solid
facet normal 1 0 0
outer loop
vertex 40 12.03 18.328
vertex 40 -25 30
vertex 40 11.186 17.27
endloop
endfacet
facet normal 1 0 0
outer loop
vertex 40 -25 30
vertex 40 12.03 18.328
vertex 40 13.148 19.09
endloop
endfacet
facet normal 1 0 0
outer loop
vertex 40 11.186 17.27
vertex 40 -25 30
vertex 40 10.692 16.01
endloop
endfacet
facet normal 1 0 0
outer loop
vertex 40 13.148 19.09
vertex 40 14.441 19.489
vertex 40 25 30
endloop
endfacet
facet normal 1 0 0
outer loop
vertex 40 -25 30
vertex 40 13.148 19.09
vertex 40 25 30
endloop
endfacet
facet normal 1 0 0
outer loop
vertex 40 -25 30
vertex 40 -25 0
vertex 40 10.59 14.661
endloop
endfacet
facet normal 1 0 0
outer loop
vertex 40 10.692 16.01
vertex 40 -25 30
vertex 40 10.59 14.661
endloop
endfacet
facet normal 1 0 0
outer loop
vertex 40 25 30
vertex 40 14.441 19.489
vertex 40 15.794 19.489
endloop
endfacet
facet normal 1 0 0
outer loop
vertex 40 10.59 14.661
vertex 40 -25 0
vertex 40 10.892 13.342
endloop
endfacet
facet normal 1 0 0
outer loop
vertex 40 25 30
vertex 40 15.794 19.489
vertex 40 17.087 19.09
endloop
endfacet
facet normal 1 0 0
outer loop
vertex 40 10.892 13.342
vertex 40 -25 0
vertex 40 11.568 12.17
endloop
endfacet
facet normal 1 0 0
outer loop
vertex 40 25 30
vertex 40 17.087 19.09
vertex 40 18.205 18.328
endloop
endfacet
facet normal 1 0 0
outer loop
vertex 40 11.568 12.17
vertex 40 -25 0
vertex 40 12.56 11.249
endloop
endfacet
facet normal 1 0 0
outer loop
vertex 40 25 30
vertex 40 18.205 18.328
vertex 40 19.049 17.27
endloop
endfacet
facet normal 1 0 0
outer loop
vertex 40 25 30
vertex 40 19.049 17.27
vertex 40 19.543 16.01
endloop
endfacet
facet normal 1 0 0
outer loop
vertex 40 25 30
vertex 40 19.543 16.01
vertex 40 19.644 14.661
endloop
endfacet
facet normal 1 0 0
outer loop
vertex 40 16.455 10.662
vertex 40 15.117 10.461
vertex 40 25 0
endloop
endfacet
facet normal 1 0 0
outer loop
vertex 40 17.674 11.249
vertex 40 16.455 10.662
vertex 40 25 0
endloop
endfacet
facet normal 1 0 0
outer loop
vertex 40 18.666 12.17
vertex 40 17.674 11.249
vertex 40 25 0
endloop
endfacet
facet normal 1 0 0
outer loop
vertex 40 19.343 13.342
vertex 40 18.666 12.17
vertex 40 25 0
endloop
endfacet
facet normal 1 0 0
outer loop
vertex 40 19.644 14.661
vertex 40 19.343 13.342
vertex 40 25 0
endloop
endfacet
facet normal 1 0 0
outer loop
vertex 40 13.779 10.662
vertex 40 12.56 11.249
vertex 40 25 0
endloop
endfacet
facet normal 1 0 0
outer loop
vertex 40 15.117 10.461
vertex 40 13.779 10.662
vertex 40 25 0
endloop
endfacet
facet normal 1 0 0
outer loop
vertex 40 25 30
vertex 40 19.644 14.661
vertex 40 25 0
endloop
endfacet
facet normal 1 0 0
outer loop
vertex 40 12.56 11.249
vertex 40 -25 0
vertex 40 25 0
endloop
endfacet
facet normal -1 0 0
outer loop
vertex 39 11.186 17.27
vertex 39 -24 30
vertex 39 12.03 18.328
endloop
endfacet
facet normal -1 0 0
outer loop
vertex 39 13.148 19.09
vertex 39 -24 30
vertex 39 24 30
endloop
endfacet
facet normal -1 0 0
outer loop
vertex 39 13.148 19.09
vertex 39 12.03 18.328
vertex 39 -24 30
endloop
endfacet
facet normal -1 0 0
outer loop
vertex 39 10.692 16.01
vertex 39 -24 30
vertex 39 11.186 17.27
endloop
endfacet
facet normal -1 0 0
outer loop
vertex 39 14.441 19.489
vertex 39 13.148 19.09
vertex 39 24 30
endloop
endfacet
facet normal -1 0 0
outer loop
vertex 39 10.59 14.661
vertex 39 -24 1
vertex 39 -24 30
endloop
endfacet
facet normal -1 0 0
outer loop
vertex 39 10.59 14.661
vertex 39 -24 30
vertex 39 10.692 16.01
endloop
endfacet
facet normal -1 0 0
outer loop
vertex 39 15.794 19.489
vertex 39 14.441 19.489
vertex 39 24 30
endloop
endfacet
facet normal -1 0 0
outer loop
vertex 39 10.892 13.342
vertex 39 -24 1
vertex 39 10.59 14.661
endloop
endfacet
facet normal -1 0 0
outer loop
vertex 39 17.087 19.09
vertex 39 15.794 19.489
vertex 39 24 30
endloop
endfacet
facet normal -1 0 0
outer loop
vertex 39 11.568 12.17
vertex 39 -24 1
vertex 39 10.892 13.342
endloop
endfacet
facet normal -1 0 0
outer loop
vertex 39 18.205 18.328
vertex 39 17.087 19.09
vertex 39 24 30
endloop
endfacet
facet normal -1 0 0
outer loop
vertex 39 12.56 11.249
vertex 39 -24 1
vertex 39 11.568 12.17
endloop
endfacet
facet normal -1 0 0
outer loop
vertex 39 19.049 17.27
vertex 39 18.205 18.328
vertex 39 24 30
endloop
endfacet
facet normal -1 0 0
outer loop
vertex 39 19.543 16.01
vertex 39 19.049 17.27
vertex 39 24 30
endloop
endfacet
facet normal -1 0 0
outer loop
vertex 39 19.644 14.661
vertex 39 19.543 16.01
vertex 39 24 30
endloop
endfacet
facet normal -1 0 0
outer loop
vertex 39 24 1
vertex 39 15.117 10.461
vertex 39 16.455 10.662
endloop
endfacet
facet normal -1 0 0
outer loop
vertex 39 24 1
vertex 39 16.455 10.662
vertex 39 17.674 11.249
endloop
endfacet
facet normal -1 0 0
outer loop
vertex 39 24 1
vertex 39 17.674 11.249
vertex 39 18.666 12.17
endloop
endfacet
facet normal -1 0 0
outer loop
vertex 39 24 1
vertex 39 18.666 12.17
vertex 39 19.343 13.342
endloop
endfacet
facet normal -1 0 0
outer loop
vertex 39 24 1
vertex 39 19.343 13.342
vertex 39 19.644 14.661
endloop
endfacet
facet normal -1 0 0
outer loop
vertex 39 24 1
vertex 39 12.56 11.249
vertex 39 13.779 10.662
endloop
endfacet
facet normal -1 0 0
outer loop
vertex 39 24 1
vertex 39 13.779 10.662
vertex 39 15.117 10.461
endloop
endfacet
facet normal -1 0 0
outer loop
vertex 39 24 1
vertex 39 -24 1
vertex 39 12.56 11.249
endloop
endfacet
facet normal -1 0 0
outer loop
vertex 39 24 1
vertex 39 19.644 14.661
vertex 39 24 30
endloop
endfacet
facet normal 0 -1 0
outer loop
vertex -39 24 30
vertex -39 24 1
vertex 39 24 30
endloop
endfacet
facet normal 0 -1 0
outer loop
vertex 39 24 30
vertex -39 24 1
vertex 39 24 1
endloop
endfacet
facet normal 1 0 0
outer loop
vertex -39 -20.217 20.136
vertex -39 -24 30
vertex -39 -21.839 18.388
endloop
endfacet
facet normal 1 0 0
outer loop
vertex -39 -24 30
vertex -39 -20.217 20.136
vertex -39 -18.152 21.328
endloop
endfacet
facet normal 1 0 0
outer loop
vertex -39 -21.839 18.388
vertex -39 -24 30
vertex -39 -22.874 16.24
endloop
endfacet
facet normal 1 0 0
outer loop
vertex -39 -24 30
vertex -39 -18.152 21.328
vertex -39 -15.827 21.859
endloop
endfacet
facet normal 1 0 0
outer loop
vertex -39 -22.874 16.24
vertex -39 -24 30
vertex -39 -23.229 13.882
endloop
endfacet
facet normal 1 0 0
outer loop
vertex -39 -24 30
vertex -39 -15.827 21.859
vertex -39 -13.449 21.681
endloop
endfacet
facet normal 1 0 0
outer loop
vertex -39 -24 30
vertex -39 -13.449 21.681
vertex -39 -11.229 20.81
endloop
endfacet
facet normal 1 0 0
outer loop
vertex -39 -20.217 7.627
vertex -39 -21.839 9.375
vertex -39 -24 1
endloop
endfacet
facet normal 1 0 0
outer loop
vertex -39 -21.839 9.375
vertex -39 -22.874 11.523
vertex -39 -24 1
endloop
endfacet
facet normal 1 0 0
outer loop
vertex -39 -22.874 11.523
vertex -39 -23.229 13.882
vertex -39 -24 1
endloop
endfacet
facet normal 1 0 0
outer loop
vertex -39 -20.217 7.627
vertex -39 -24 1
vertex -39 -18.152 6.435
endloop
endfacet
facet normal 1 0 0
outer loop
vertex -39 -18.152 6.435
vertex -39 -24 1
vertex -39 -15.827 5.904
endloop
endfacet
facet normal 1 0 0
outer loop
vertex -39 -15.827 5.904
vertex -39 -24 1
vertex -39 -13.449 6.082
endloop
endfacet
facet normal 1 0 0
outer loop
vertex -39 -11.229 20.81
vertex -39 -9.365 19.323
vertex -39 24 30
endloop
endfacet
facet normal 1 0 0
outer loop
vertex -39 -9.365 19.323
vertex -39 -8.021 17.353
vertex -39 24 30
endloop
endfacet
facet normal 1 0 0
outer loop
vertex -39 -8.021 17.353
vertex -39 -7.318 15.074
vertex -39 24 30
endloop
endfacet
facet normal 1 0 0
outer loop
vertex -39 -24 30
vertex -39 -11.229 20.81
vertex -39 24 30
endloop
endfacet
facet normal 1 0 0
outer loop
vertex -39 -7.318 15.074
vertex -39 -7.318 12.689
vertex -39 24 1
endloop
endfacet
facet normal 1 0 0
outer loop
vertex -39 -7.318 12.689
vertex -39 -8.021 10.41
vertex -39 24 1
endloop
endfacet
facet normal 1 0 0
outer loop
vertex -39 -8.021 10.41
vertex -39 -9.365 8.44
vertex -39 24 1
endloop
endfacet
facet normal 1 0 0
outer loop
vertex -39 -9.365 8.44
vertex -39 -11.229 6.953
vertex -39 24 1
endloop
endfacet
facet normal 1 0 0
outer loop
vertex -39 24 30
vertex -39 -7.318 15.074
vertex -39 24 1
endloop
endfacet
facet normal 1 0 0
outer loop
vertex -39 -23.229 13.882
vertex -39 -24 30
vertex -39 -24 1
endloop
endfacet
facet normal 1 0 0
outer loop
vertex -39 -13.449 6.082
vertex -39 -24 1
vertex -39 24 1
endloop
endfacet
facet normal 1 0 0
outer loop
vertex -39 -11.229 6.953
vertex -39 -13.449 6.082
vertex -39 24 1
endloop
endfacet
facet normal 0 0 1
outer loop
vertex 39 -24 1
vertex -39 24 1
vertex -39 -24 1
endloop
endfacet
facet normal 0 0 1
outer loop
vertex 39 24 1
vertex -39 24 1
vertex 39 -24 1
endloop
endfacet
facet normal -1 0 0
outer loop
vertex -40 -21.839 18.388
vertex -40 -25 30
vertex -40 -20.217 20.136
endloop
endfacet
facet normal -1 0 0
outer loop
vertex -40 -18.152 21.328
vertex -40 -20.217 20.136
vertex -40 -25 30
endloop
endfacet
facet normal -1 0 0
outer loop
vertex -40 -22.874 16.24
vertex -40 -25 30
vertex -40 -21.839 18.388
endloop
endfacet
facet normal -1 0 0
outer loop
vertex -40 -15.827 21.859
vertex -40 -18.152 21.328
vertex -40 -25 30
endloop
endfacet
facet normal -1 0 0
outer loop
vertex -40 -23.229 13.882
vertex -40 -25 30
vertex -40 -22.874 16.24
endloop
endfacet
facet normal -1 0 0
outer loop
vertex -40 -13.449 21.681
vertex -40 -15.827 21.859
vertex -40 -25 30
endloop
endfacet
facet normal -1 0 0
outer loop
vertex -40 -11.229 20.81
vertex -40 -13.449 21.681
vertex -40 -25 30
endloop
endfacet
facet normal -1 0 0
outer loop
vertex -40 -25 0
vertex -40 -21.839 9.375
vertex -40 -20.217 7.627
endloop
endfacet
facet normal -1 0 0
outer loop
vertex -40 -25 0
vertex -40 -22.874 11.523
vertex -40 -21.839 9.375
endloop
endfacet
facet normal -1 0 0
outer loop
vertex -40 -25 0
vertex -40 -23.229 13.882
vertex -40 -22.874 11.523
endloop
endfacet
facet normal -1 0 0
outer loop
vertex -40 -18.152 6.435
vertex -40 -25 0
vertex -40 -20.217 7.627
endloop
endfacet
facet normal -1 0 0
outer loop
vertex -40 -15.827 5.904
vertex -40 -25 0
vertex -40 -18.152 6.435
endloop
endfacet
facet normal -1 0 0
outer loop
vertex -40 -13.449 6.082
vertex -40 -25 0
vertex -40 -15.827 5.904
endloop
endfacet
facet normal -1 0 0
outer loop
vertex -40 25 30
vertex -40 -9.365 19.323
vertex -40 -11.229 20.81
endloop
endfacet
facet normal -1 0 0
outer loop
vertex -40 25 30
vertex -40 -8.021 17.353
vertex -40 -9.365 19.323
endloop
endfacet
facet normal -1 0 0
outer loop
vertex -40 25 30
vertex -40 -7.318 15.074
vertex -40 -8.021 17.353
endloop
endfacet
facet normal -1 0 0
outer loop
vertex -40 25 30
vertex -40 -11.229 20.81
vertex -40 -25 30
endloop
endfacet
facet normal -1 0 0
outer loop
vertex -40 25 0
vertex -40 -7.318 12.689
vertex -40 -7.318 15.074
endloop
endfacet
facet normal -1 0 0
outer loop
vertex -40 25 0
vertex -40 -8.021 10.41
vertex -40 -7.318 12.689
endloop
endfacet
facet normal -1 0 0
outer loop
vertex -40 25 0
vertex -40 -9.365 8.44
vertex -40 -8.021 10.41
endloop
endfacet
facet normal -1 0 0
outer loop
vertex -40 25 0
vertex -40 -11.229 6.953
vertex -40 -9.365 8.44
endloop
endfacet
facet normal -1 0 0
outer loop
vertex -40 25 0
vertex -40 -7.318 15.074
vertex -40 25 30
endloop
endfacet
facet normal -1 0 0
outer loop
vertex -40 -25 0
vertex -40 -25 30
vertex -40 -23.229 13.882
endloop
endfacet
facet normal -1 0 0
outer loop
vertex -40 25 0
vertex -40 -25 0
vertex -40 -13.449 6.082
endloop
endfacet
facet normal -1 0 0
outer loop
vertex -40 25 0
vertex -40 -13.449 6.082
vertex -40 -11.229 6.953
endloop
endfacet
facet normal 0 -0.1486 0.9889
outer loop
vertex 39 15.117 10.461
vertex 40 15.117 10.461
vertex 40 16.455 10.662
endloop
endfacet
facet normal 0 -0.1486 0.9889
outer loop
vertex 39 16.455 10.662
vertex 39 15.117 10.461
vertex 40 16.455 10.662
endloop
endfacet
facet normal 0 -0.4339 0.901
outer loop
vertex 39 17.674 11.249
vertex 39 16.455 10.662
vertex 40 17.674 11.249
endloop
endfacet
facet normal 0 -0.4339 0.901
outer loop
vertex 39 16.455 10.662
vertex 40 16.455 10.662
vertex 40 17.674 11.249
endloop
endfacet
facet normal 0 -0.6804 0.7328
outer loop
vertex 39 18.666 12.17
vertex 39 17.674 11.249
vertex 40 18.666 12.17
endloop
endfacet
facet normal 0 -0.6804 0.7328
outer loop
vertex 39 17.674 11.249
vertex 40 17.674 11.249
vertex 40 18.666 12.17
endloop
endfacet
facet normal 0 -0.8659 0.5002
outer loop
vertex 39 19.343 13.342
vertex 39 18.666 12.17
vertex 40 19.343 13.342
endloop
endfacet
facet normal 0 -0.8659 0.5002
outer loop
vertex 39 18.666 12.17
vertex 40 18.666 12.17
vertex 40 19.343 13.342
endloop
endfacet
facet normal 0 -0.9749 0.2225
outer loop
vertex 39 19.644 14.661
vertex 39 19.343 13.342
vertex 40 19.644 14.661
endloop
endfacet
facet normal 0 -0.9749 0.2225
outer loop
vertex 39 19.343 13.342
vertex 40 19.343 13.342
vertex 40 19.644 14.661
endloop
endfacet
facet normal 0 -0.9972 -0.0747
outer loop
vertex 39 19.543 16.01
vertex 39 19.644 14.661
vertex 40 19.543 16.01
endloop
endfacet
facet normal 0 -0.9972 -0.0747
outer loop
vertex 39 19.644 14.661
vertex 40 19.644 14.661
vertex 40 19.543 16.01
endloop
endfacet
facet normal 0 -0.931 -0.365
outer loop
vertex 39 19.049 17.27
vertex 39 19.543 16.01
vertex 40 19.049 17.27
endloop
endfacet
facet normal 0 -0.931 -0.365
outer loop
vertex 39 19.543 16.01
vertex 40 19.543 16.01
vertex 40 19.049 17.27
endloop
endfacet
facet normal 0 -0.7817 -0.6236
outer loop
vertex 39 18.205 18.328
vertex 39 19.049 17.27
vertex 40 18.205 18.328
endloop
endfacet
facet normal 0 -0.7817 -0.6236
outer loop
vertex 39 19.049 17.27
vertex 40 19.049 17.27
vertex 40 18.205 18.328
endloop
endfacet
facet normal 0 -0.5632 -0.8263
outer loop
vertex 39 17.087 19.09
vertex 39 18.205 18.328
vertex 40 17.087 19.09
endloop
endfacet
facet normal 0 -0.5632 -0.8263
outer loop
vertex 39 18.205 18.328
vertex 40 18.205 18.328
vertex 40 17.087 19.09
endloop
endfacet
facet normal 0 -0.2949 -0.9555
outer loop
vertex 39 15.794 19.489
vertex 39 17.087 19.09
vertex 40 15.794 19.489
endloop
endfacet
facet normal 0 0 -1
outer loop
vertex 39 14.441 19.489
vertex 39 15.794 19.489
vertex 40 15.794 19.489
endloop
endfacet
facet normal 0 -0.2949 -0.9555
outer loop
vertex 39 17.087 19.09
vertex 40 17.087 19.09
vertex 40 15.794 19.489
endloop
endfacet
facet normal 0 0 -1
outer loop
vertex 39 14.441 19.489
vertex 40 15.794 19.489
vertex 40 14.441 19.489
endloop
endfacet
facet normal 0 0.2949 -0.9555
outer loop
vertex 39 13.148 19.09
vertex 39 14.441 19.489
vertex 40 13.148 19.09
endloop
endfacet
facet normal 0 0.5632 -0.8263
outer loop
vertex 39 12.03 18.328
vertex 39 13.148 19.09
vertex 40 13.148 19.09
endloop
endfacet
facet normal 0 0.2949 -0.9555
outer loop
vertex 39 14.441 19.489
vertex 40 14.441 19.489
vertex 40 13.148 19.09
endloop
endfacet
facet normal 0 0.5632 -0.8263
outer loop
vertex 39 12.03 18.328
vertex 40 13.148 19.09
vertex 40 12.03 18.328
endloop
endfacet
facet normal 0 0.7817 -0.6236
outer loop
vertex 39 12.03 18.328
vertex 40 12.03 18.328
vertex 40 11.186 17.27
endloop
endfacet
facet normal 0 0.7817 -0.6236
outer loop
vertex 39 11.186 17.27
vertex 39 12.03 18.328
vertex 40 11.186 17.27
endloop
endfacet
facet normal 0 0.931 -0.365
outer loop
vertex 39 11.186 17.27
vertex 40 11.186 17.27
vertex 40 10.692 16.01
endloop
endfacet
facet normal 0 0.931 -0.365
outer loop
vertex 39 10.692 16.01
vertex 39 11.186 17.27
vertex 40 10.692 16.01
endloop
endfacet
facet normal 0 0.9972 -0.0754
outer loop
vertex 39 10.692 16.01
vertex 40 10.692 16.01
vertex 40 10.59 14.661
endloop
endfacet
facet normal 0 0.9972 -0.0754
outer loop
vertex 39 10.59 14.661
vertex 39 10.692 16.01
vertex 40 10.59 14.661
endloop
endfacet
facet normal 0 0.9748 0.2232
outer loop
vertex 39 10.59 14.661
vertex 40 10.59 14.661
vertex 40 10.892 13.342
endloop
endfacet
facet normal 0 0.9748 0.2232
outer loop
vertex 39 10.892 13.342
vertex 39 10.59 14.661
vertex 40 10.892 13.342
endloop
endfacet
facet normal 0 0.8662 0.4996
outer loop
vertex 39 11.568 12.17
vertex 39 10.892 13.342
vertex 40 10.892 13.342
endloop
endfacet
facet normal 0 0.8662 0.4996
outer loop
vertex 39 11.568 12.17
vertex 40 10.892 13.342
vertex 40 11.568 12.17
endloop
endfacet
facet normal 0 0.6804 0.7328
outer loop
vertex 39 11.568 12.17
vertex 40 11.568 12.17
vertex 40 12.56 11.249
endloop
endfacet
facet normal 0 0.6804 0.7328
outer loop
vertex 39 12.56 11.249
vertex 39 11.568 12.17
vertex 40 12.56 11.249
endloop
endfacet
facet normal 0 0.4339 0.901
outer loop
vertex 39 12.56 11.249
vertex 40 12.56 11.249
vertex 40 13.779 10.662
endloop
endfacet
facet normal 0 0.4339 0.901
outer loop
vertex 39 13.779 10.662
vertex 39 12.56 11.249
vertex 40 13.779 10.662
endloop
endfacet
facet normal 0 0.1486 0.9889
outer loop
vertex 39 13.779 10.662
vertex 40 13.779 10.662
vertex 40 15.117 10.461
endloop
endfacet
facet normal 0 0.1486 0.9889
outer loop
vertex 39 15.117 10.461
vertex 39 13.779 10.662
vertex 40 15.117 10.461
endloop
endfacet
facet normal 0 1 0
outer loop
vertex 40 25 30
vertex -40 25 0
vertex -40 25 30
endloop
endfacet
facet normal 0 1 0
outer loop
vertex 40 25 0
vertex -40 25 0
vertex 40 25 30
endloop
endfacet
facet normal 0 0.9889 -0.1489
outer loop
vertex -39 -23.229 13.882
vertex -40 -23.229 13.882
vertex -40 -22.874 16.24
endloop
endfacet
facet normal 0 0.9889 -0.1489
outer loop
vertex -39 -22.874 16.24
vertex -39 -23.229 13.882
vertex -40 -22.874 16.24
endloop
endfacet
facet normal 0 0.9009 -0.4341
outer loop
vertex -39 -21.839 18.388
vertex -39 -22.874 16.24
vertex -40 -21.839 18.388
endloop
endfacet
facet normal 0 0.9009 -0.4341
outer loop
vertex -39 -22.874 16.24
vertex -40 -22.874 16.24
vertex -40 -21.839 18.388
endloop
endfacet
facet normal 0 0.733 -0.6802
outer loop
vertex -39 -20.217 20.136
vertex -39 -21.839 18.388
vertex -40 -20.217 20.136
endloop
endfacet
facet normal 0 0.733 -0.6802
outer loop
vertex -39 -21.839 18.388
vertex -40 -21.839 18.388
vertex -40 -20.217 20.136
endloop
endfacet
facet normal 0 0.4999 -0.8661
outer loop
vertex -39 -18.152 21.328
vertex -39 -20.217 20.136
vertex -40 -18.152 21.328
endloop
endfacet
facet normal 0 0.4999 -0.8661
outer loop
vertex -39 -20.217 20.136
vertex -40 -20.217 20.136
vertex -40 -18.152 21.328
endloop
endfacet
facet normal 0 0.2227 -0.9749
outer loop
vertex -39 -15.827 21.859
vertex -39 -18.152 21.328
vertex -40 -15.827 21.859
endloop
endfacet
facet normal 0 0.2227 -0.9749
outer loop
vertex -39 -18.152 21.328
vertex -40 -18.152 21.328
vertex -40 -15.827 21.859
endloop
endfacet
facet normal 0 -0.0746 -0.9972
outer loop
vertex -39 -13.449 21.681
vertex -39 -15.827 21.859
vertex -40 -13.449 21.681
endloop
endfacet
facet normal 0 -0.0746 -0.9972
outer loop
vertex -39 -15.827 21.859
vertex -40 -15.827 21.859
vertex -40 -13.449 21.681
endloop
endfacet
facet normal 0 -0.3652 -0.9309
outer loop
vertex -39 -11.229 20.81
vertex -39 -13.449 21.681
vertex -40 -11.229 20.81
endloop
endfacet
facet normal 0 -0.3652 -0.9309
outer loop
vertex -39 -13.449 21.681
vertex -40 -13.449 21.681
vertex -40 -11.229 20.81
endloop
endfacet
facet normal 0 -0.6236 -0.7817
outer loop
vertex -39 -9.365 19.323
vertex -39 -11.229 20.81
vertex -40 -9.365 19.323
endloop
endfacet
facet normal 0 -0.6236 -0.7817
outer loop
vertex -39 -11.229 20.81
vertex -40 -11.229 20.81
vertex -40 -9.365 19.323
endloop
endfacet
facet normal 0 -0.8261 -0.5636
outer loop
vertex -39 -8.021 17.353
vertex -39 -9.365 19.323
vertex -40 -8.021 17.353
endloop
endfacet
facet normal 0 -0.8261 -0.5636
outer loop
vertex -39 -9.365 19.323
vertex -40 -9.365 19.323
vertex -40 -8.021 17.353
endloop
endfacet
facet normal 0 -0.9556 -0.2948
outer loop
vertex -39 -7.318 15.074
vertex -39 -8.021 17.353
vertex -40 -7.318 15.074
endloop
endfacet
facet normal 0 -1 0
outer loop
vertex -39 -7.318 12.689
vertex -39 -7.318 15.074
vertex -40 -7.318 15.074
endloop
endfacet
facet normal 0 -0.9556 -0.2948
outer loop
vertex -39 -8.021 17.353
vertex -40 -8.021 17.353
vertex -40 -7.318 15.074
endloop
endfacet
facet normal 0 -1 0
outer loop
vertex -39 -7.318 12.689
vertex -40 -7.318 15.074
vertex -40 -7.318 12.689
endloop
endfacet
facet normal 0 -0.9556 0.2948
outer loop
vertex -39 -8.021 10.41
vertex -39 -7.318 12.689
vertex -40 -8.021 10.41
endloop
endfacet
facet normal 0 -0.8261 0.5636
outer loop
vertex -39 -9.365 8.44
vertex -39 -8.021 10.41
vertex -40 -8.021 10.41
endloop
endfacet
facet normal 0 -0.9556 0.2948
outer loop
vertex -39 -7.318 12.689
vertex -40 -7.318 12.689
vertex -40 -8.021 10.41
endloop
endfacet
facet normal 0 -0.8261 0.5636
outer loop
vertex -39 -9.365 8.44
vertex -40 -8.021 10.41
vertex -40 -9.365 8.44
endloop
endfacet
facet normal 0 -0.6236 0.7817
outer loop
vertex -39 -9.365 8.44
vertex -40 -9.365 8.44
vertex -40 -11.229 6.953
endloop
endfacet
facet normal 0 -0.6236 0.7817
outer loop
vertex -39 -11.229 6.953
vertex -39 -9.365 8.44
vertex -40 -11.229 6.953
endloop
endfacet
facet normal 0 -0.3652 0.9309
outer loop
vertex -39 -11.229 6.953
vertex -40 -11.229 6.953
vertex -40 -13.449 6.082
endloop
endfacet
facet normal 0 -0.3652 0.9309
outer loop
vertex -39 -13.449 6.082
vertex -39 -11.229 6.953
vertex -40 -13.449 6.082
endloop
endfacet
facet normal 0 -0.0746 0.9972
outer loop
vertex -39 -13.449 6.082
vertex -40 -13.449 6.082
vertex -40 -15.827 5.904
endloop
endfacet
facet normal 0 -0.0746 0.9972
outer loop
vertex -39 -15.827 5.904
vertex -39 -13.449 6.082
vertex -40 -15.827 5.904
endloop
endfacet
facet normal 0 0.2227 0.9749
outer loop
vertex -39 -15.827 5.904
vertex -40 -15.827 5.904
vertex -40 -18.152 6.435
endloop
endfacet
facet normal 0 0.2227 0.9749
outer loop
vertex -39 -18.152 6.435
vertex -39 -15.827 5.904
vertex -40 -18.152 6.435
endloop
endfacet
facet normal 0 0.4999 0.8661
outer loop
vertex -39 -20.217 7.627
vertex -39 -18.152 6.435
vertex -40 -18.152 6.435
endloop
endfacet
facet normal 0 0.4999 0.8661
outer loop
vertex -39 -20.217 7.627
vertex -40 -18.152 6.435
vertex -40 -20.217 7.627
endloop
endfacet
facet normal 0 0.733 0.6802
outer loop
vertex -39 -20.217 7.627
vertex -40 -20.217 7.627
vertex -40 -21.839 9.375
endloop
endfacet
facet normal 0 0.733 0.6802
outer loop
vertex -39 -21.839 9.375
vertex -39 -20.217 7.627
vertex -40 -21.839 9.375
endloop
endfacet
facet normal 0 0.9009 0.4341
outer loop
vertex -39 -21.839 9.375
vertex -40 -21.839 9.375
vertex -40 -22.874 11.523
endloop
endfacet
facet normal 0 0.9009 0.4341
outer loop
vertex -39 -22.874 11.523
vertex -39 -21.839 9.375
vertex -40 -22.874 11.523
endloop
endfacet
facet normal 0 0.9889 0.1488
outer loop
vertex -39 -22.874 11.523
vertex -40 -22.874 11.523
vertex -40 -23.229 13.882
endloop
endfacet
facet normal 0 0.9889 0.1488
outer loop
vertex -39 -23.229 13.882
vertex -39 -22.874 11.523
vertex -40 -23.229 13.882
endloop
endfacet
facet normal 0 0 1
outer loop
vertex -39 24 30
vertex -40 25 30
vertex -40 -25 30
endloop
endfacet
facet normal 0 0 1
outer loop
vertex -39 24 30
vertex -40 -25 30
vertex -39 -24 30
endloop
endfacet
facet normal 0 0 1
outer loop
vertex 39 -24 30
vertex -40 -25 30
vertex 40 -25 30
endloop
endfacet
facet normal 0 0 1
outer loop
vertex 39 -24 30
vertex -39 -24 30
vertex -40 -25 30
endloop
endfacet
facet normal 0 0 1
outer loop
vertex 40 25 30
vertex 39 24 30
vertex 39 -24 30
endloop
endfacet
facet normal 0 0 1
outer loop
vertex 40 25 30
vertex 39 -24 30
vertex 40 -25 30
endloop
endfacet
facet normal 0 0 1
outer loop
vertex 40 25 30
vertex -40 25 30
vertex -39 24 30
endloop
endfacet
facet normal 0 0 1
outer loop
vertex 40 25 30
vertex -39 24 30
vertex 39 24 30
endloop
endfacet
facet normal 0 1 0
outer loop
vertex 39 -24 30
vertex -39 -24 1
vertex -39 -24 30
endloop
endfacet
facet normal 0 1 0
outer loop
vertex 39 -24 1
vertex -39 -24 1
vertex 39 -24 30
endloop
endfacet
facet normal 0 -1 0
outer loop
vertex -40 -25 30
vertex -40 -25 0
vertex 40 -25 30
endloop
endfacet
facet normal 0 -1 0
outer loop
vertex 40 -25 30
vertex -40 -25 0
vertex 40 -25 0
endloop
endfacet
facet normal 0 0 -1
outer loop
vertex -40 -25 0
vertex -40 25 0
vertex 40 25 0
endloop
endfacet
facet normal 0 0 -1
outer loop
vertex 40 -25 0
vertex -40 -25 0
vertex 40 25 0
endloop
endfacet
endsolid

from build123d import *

# Parameters (mm, degrees)
SKETCH_1_W          = 80
SKETCH_1_H          = 50
EXTRUDE_1_DEPTH     = 30
SHELL_1_T           = -1
SKETCH_3_R          = 4.539465833
CUT_EXTRUDE_1_DEPTH = 30
SKETCH_4_R          = 8
CUT_EXTRUDE_2_DEPTH = 30


with BuildPart() as part:
    # 草图1 → 凸台-拉伸1 (new body)
    with BuildSketch(Plane.XY):
        Rectangle(SKETCH_1_W, SKETCH_1_H)
    extrude(amount=EXTRUDE_1_DEPTH)

    # 抽壳1
    shell_1_openings = [part.faces().sort_by_distance(p)[0] for p in [
        (0, 0, 30),
    ]]
    offset(amount=SHELL_1_T, openings=shell_1_openings, kind=Kind.INTERSECTION)

    # 草图3 → 切除-拉伸1 (cut)
    with BuildSketch(Plane(origin=(40, 0, 0), x_dir=(0, 0, -1), z_dir=(1, 0, 0))):
        with Locations((-15, 15.117251004)):
            Circle(SKETCH_3_R)
    extrude(amount=-CUT_EXTRUDE_1_DEPTH, mode=Mode.SUBTRACT)

    # 草图4 → 切除-拉伸2 (cut)
    with BuildSketch(Plane.ZY.offset(40)):
        with Locations(Location((13.881500003, -15.22906305, 0), (0, 0, 270))):
            Circle(SKETCH_4_R)
    extrude(amount=-CUT_EXTRUDE_2_DEPTH, mode=Mode.SUBTRACT)


solid = part.part
